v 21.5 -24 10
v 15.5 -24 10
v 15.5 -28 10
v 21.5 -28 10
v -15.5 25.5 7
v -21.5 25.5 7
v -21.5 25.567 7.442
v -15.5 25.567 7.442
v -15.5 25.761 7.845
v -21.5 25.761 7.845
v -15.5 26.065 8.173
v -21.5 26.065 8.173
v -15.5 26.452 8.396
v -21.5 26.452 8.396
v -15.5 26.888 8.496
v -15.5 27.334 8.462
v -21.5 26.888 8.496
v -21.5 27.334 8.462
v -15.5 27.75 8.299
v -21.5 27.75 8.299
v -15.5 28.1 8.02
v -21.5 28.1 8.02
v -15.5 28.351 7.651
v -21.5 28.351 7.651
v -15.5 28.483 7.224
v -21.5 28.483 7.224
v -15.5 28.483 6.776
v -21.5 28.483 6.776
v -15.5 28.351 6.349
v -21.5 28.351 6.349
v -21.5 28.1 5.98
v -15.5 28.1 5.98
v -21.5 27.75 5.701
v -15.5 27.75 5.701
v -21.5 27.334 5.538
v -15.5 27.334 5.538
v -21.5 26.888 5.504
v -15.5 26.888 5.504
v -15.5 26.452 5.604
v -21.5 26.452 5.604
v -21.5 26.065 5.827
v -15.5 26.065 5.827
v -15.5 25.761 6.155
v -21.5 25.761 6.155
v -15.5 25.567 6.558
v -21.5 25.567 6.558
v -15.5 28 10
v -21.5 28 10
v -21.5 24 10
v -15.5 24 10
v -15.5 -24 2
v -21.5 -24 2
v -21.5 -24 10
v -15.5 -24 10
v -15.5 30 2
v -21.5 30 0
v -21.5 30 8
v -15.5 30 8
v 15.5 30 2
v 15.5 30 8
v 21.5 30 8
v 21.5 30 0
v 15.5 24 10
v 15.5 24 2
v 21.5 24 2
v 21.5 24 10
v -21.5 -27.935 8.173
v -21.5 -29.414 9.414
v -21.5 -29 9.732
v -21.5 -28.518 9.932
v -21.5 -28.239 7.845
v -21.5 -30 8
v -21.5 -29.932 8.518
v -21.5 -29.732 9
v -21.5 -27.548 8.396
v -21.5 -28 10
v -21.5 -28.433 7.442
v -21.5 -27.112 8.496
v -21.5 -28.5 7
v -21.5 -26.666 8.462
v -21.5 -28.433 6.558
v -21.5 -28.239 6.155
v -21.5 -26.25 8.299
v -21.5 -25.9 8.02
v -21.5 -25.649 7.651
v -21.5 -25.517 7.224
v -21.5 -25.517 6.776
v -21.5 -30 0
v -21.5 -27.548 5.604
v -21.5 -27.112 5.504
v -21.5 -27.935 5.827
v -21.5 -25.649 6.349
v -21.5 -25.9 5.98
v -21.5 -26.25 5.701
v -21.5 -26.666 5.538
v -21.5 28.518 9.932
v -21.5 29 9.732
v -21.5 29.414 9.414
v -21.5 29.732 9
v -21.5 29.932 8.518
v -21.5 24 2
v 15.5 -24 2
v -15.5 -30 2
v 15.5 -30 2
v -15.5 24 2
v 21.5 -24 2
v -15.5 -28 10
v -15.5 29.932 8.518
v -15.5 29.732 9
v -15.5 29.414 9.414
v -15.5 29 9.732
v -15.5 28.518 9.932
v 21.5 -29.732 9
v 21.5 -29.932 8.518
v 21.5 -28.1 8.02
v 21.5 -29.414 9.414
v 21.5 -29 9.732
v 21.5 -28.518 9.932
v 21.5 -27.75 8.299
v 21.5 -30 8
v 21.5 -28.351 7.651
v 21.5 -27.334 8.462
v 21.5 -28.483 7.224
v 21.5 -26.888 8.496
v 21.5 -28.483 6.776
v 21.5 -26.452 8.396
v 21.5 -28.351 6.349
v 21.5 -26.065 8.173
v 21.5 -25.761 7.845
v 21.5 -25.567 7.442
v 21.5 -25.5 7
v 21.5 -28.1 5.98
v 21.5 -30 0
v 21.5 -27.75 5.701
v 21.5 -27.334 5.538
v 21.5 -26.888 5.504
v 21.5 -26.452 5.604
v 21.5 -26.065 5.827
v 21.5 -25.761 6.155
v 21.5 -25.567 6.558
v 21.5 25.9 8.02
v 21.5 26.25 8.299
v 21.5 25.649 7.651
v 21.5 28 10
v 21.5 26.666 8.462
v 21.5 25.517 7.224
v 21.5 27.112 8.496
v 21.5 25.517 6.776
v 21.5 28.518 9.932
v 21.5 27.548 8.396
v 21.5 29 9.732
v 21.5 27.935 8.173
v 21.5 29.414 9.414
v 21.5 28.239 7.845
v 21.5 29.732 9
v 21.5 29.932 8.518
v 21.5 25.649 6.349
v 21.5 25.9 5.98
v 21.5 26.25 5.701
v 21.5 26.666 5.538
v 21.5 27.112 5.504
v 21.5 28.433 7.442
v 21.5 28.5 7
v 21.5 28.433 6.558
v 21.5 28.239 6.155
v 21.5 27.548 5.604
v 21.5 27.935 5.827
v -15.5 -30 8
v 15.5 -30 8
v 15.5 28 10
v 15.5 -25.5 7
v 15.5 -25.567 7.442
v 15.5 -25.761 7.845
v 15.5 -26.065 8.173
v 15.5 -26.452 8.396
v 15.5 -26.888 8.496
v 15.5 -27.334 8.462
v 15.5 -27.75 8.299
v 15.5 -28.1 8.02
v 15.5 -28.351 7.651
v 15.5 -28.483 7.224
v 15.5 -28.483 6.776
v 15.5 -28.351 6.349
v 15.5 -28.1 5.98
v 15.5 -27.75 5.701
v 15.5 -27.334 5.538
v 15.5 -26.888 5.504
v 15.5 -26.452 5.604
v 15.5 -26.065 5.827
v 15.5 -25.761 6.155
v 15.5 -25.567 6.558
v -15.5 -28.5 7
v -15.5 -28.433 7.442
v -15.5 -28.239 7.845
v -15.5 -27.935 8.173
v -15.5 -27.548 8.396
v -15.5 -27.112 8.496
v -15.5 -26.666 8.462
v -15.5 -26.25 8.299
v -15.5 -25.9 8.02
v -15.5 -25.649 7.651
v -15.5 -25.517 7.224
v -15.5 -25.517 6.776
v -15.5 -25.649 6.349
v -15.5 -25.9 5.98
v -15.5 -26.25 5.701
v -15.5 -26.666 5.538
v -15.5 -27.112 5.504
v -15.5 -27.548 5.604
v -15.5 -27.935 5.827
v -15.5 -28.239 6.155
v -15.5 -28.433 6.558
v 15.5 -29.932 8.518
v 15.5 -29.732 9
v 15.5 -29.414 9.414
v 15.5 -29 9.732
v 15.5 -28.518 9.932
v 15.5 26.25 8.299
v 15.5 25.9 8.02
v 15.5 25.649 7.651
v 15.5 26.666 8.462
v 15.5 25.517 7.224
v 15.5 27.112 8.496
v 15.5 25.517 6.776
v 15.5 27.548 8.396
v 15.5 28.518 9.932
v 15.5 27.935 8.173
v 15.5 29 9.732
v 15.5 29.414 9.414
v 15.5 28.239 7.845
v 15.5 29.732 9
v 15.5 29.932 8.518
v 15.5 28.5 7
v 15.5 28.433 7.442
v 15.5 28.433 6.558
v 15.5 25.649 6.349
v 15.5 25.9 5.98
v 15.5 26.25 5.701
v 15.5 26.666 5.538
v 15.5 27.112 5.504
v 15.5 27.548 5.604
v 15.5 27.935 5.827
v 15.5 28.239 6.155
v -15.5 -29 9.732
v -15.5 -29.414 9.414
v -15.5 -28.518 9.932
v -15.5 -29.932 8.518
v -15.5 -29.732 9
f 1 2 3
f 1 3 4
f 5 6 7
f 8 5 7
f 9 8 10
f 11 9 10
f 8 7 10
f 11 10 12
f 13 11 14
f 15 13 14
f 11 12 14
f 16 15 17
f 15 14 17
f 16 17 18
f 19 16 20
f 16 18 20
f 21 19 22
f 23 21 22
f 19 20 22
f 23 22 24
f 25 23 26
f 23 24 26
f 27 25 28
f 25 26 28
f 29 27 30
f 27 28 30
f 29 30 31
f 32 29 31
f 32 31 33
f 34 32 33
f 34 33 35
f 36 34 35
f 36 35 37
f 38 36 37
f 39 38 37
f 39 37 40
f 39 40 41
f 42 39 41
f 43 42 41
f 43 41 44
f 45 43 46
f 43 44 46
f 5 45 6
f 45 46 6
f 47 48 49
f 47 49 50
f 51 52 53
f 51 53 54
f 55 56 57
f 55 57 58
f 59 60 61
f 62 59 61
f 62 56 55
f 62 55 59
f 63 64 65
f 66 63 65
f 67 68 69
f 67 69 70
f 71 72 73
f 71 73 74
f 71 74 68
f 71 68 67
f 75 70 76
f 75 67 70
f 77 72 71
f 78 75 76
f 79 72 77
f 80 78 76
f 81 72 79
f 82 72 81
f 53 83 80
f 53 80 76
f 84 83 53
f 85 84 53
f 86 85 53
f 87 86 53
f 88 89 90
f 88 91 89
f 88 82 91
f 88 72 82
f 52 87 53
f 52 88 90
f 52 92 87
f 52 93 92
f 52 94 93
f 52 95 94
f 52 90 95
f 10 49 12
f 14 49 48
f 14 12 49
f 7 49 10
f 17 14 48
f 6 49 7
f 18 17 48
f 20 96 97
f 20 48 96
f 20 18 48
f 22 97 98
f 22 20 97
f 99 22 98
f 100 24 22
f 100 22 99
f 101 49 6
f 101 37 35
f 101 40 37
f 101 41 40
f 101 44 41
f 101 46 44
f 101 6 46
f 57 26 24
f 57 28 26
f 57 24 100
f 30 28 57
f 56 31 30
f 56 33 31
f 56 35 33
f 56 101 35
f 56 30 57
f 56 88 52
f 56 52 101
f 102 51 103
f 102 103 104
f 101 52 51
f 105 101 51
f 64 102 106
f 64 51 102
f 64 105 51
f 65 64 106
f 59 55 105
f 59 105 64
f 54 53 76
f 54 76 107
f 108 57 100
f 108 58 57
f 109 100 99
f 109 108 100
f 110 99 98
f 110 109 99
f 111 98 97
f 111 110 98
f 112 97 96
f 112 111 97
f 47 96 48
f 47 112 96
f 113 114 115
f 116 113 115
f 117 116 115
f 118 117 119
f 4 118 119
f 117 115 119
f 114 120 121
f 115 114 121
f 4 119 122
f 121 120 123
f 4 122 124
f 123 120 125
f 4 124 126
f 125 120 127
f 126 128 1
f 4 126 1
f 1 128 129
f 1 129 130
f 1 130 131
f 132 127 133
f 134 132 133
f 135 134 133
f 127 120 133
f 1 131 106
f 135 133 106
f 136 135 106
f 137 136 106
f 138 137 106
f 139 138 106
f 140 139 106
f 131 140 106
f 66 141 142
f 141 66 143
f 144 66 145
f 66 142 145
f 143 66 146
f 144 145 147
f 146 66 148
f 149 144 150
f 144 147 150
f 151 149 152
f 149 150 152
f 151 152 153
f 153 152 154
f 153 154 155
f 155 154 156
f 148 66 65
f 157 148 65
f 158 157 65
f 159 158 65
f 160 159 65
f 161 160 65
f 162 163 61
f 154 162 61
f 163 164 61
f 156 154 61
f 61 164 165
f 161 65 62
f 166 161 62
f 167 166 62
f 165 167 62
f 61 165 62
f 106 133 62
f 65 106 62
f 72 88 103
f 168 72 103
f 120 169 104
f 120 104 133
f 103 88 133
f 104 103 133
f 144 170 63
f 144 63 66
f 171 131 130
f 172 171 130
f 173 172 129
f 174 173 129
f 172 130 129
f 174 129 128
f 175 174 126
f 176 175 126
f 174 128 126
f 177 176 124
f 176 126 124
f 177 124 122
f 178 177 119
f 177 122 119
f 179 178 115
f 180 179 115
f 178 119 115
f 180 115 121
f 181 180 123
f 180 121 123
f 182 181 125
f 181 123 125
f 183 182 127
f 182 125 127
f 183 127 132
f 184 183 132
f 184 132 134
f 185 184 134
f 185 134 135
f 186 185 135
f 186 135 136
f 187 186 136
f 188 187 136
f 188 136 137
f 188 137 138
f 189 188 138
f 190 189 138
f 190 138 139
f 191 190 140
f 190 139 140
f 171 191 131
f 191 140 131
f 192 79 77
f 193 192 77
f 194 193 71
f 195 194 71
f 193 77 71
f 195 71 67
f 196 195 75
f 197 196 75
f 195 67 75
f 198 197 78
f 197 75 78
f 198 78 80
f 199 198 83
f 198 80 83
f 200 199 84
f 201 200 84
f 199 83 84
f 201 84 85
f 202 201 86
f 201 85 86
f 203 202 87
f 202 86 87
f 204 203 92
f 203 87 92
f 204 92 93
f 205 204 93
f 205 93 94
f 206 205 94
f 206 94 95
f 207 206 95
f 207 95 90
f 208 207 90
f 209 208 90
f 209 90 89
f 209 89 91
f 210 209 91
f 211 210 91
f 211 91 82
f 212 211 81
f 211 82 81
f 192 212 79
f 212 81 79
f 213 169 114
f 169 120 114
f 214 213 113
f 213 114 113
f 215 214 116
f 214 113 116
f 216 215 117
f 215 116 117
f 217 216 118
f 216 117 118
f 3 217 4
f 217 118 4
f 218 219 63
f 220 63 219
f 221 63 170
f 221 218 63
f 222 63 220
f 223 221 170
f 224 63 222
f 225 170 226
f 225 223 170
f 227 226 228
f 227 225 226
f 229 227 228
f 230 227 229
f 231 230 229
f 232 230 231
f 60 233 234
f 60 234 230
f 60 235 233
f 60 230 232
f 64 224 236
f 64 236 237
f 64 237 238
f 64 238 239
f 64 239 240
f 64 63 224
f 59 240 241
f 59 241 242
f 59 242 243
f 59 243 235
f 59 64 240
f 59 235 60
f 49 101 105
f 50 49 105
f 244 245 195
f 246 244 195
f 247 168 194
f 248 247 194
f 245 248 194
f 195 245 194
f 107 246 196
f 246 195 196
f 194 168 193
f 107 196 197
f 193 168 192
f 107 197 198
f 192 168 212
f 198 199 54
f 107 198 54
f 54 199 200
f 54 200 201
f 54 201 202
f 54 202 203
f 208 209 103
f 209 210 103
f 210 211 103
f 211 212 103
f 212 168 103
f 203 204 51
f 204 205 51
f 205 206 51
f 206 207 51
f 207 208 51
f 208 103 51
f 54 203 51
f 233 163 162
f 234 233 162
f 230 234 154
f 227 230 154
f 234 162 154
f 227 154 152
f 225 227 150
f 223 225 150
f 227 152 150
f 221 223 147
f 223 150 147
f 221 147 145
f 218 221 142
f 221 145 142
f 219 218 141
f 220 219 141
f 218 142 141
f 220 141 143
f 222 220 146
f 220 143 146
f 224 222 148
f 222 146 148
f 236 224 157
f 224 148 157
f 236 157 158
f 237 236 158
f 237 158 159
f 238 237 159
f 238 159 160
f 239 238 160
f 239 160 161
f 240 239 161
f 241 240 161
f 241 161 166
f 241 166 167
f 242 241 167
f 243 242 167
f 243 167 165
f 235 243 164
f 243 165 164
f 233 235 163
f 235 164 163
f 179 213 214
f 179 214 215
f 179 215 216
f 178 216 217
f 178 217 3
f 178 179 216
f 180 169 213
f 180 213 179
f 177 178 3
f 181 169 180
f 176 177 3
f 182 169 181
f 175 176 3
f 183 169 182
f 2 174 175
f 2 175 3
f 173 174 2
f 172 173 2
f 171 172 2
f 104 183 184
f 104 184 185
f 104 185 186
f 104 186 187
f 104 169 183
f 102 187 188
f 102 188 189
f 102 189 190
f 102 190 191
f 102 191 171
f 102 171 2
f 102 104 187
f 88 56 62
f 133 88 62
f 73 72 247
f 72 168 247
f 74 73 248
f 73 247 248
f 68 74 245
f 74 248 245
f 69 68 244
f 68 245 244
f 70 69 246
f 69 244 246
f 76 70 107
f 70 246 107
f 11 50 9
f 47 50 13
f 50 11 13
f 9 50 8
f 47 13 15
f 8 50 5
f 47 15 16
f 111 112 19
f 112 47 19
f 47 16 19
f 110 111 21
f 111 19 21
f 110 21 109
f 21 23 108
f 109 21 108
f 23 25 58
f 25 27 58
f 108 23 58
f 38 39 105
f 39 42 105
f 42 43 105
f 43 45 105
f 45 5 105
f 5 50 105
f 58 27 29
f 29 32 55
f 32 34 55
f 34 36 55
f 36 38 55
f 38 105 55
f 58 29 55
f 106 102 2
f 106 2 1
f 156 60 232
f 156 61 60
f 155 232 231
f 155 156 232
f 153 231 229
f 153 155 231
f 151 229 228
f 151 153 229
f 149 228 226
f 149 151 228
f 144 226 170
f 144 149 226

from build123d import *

# Parameters (mm, degrees)
SKETCH_W        = 43
SKETCH_H        = 60
PAD_DEPTH       = 2
SKETCH001_W     = 6
SKETCH001_H     = 6
PAD001_DEPTH    = 8
SKETCH002_R     = 1.5
POCKET_DEPTH    = 6
SKETCH003_R     = 1.5
POCKET001_DEPTH = 6
FILLET_R        = 2
FILLET001_R     = 2
FILLET002_R     = 2
FILLET003_R     = 2


with BuildPart() as part:
    # Sketch → Pad (new body)
    with BuildSketch(Plane.XY):
        Rectangle(SKETCH_W, SKETCH_H)
    extrude(amount=PAD_DEPTH)

    # Sketch001 (on Face6 of Pad) → Pad001 (join)
    with BuildSketch(Plane.XY.offset(2)):
        with Locations((-18.5, 27)):
            Rectangle(SKETCH001_W, SKETCH001_H)
        with Locations((18.5, 27)):
            Rectangle(SKETCH001_W, SKETCH001_H)
        with Locations((-18.5, -27)):
            Rectangle(SKETCH001_W, SKETCH001_H)
        with Locations((18.5, -27)):
            Rectangle(SKETCH001_W, SKETCH001_H)
    extrude(amount=PAD001_DEPTH)

    # Sketch002 (on Face12 of Pad001) → Pocket (cut)
    with BuildSketch(Plane.YZ.offset(21.5)):
        with Locations((-27, 7)):
            Circle(SKETCH002_R)
        with Locations((27, 7)):
            Circle(SKETCH002_R)
    extrude(amount=-POCKET_DEPTH, mode=Mode.SUBTRACT)

    # Sketch003 (on Face10 of Pocket) → Pocket001 (cut)
    with BuildSketch(Plane(origin=(-21.5, 0, 0), x_dir=(0, -1, 0), z_dir=(-1, 0, 0))):
        with Locations((-27, 7)):
            Circle(SKETCH003_R)
        with Locations((27, 7)):
            Circle(SKETCH003_R)
    extrude(amount=-POCKET001_DEPTH, mode=Mode.SUBTRACT)

    # Fillet
    fillet_edges = [part.edges().sort_by_distance(p)[0] for p in [
        (18.5, 30, 10),
    ]]
    fillet(fillet_edges, radius=FILLET_R)

    # Fillet001
    fillet001_edges = [part.edges().sort_by_distance(p)[0] for p in [
        (-18.5, 30, 10),
    ]]
    fillet(fillet001_edges, radius=FILLET001_R)

    # Fillet002
    fillet002_edges = [part.edges().sort_by_distance(p)[0] for p in [
        (-18.5, -30, 10),
    ]]
    fillet(fillet002_edges, radius=FILLET002_R)

    # Fillet003
    fillet003_edges = [part.edges().sort_by_distance(p)[0] for p in [
        (18.5, -30, 10),
    ]]
    fillet(fillet003_edges, radius=FILLET003_R)


solid = part.part
